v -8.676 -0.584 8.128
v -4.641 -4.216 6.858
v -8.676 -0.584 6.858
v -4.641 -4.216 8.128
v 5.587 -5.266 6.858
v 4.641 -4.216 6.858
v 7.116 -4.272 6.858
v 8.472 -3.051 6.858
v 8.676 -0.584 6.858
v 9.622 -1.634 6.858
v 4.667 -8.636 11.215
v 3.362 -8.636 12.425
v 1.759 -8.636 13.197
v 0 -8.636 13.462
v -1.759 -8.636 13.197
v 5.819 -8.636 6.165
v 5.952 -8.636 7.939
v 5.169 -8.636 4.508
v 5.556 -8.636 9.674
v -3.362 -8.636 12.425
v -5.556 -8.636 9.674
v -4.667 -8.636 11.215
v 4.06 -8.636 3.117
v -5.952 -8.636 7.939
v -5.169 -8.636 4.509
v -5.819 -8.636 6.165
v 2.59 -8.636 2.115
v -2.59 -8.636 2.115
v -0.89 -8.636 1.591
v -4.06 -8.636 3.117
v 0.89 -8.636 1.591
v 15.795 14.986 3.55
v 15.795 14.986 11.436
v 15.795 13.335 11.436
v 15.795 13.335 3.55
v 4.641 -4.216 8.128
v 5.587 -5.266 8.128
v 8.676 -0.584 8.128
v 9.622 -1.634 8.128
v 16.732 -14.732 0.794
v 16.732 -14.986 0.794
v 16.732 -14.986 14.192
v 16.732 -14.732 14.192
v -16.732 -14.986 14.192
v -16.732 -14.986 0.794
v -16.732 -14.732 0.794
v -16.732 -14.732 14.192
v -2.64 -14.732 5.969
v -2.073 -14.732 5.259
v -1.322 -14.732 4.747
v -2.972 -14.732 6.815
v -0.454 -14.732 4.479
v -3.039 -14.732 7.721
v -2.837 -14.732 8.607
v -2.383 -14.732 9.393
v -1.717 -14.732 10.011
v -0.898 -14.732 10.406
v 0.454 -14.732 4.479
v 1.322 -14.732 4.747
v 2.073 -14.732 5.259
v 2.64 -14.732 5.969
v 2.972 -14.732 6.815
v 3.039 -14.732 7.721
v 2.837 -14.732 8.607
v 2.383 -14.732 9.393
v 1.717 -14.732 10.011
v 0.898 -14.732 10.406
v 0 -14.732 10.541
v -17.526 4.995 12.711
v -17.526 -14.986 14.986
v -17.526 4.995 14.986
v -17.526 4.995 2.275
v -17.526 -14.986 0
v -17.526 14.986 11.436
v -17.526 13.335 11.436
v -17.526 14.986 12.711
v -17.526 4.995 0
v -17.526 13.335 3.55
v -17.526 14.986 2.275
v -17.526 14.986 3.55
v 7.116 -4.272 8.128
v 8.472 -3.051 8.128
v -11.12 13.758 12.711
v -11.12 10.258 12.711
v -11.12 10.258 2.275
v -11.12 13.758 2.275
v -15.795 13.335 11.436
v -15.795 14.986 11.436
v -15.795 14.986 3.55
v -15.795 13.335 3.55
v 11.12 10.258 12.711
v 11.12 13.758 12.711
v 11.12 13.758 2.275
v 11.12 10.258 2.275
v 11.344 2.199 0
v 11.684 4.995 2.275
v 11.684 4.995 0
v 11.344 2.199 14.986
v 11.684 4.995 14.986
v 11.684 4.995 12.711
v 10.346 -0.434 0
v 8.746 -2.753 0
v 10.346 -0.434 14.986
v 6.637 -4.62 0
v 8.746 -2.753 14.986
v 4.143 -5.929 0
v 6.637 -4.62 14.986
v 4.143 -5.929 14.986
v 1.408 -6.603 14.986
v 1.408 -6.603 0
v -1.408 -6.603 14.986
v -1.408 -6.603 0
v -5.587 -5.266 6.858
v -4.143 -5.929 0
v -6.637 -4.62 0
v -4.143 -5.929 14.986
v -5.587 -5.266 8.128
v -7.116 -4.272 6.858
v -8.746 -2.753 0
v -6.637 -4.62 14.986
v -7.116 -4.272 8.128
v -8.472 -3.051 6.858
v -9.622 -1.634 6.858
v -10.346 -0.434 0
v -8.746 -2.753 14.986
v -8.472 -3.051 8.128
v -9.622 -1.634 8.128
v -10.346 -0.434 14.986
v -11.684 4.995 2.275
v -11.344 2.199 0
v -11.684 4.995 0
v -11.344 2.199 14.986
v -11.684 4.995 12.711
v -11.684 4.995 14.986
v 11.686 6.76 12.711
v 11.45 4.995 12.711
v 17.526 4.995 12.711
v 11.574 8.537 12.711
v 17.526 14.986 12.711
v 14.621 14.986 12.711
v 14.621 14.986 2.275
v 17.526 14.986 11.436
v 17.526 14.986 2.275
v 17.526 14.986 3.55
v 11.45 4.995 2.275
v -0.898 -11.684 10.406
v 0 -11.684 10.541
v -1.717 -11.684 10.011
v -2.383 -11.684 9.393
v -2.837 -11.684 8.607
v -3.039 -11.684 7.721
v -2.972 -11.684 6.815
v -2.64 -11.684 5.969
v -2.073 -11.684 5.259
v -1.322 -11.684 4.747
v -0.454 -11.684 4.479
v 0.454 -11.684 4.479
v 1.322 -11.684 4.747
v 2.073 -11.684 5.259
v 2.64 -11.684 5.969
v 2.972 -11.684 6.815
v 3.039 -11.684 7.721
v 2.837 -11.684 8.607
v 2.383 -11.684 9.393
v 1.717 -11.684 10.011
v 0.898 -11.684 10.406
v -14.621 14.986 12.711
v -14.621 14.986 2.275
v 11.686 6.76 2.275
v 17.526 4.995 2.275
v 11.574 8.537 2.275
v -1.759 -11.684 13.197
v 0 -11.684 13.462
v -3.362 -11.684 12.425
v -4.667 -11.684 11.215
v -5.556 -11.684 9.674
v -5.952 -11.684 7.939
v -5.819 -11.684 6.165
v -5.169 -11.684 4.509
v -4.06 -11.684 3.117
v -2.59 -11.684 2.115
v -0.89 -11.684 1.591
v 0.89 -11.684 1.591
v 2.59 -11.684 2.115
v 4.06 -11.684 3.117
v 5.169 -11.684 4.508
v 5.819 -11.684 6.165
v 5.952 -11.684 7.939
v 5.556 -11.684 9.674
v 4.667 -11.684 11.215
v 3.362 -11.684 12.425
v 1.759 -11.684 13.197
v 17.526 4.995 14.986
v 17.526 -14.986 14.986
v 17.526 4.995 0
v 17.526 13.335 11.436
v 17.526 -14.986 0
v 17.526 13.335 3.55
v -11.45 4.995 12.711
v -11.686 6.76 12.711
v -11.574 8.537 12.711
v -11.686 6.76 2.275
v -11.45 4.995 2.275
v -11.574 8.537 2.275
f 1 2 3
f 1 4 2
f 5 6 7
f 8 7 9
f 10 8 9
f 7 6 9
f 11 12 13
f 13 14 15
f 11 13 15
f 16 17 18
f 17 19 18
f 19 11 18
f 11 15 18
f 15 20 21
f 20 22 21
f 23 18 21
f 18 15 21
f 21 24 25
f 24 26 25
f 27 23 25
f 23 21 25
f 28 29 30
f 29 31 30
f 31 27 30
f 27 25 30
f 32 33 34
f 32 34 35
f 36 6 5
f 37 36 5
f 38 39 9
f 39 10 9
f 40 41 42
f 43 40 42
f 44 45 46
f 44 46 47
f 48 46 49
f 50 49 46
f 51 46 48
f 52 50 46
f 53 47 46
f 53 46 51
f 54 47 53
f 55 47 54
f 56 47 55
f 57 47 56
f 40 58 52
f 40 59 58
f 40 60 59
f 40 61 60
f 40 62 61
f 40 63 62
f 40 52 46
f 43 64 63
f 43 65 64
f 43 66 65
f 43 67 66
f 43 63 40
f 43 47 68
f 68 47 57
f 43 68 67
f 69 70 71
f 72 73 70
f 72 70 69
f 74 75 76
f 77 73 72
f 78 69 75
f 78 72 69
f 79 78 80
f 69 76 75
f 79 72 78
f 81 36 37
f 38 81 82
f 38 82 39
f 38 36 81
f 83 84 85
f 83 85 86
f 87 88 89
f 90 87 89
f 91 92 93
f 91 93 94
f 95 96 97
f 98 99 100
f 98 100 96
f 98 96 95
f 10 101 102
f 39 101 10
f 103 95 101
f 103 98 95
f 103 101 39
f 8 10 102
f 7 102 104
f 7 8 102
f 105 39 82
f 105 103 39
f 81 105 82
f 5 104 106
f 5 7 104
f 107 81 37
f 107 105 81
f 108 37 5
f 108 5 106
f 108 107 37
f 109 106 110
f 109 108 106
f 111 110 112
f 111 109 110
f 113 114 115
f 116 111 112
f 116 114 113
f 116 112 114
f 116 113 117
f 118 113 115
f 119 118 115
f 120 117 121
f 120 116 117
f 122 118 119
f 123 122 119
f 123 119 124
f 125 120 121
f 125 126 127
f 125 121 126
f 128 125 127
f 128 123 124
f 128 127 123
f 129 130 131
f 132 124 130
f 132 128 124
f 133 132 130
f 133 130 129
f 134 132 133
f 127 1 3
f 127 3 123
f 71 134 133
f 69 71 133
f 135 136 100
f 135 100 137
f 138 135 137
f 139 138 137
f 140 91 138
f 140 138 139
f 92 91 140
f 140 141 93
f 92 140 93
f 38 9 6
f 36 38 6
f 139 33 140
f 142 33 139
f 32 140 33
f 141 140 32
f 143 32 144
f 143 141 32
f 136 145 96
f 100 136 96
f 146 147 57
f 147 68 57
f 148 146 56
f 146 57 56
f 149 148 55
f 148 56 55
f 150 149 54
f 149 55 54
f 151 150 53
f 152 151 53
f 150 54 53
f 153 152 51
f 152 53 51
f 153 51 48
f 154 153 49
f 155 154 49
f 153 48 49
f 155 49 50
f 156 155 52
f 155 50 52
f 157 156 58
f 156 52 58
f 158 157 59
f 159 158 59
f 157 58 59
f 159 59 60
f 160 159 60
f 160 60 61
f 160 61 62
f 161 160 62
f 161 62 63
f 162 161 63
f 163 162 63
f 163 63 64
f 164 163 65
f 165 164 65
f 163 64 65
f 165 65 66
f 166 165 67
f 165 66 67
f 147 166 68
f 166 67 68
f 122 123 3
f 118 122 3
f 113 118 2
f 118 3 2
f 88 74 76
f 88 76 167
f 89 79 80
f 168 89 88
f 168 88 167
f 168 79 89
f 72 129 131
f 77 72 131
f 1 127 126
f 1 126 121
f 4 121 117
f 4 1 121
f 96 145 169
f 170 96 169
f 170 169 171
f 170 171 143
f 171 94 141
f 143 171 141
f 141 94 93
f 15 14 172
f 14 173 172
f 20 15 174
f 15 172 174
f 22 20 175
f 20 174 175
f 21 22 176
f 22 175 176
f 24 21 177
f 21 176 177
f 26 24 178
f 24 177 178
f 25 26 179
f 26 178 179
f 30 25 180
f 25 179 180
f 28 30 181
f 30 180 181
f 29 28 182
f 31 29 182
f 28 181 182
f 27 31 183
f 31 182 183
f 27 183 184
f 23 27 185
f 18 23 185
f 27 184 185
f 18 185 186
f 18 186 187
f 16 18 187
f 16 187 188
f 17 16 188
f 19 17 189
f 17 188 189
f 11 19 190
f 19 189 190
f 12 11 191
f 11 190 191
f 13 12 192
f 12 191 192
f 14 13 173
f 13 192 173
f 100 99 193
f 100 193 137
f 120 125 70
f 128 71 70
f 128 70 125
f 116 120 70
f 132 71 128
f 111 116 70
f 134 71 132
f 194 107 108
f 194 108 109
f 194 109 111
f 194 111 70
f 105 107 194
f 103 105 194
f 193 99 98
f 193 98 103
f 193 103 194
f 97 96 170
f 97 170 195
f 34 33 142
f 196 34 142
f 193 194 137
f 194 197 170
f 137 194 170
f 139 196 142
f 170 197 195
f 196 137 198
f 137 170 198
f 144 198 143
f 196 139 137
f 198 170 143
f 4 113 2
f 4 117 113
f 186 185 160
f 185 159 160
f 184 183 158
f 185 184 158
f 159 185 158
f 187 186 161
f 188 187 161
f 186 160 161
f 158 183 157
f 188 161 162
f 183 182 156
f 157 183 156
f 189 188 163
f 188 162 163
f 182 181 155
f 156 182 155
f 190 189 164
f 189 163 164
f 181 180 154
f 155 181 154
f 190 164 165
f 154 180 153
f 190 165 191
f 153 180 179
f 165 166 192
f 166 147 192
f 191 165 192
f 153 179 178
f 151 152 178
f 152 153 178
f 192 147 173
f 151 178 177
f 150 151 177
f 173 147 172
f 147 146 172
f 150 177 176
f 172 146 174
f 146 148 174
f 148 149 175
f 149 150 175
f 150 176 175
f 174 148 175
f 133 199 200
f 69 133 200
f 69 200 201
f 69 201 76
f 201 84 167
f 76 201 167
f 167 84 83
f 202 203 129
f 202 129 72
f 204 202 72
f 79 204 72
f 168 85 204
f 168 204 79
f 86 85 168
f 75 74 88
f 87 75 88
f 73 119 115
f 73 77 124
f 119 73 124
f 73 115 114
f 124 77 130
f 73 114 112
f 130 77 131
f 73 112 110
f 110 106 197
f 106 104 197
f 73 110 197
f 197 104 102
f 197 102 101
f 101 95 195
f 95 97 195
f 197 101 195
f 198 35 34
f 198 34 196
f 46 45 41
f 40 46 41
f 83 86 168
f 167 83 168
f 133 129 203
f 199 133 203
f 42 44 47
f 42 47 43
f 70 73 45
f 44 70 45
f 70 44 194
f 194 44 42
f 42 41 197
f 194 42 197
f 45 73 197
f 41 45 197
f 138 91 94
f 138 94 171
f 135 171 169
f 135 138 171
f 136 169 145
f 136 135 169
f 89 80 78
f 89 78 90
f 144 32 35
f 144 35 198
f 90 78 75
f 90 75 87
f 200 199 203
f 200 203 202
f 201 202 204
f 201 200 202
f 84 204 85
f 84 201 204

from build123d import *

# Parameters (mm, degrees)
SKETCH1_W               = 35.052
SKETCH1_H               = 29.972
EXTRUDE1_DEPTH          = 14.986
CUT_EXTRUDE1_DEPTH      = 15.986
SKETCH3_W               = 2.27457
SKETCH3_H               = 9.990666667
CUT_EXTRUDE2_DEPTH      = 18.526
CUT_EXTRUDE2_DEPTH_BACK = 18.526
SKETCH4_W               = 33.4645
SKETCH4_H               = 13.3985
CUT_EXTRUDE3_DEPTH      = 0.254
SKETCH5_W               = 1.731382872
SKETCH5_H               = 7.88543
CUT_EXTRUDE4_DEPTH      = 1.651
EXTRUDE2_DEPTH          = 0.635


with BuildPart() as part:
    # Sketch1 → Extrude1 (new body)
    with BuildSketch(Plane.XY):
        Rectangle(SKETCH1_W, SKETCH1_H)
    extrude(amount=EXTRUDE1_DEPTH)

    # Sketch2 → Cut-Extrude1 (cut, through all)
    with BuildSketch(Plane.XY.offset(14.986)):
        with BuildLine():
            Line((-11.684, 4.995333333), (-11.45032, 4.995333333))
            ThreePointArc((-11.45032, 4.995333333), (-11.673292179, 7.650930846), (-11.1204375, 10.257895833))
            Line((-11.1204375, 10.257895833), (-11.1204375, 13.758333333))
            Line((-11.1204375, 13.758333333), (-14.620875, 14.986))
            Line((-14.620875, 14.986), (14.620875, 14.986))
            Line((14.620875, 14.986), (11.1204375, 13.758333333))
            Line((11.1204375, 13.758333333), (11.1204375, 10.257895833))
            ThreePointArc((11.1204375, 10.257895833), (11.673292179, 7.650930846), (11.45032, 4.995333333))
            Line((11.45032, 4.995333333), (11.684, 4.995333333))
            ThreePointArc((11.684, 4.995333333), (0, -6.688666667), (-11.684, 4.995333333))
        make_face()
    extrude(amount=-CUT_EXTRUDE1_DEPTH, mode=Mode.SUBTRACT)

    # Sketch3 → Cut-Extrude2 (cut, two sides)
    with BuildSketch(Plane(origin=(0, 0, 0), x_dir=(0, 0, -1), z_dir=(1, 0, 0))) as cut_extrude2_sk:
        with Locations((-13.848715, 9.990666667)):
            Rectangle(SKETCH3_W, SKETCH3_H)
        with Locations((-1.137285, 9.990666667)):
            Rectangle(SKETCH3_W, SKETCH3_H)
    extrude(amount=CUT_EXTRUDE2_DEPTH, mode=Mode.SUBTRACT)
    extrude(cut_extrude2_sk.sketch, amount=-CUT_EXTRUDE2_DEPTH_BACK, mode=Mode.SUBTRACT)

    # Sketch4 → Cut-Extrude3 (cut)
    with BuildSketch(Plane.XZ.offset(14.986)):
        with Locations((0, 7.493)):
            Rectangle(SKETCH4_W, SKETCH4_H)
    extrude(amount=-CUT_EXTRUDE3_DEPTH, mode=Mode.SUBTRACT)

    # Sketch5 → Cut-Extrude4 (cut)
    with BuildSketch(Plane(origin=(0, 14.986, 0), x_dir=(1, 0, 0), z_dir=(0, 1, 0))):
        with Locations((-16.660308564, -7.493)):
            Rectangle(SKETCH5_W, SKETCH5_H)
        with Locations((16.660308564, -7.493)):
            Rectangle(SKETCH5_W, SKETCH5_H)
    extrude(amount=-CUT_EXTRUDE4_DEPTH, mode=Mode.SUBTRACT)

    # Sketch6 → Cut-Revolve1 (revolve, cut)
    with BuildSketch(Plane(origin=(0, 0, 7.493), x_dir=(-1, 0, 0), z_dir=(0, 0, -1)), mode=Mode.PRIVATE) as cut_revolve1_sk:
        Polygon((3.048, -14.732), (0, -14.732), (0, -8.636), (5.969, -8.636), (5.969, -11.684), (3.048, -11.684), align=None)
    revolve(cut_revolve1_sk.sketch.rotate(Axis((0, 0, 7.493), (0, -1, 0)), 270), axis=Axis((0, 0, 7.493), (0, -1, 0)), mode=Mode.SUBTRACT)  # turned: the seam where the file's is

    # Sketch7 → Extrude2 (add, symmetric)
    with BuildSketch(Plane(origin=(0, 0, 7.493), x_dir=(-1, 0, 0), z_dir=(0, 0, -1))):
        with BuildLine():
            Line((4.641424464, -4.216434167), (8.676143507, -0.583556822))
            Line((8.676143507, -0.583556822), (9.621541413, -1.633527567))
            ThreePointArc((9.621541413, -1.633527567), (7.818122005, -3.687570808), (5.586822369, -5.266404912))
            Line((5.586822369, -5.266404912), (4.641424464, -4.216434167))
        make_face()
        with BuildLine():
            Line((-4.641424464, -4.216434167), (-5.586822369, -5.266404912))
            ThreePointArc((-5.586822369, -5.266404912), (-7.818122005, -3.687570808), (-9.621541413, -1.633527567))
            Line((-9.621541413, -1.633527567), (-8.676143507, -0.583556822))
            Line((-8.676143507, -0.583556822), (-4.641424464, -4.216434167))
        make_face()
    extrude(amount=EXTRUDE2_DEPTH, both=True)


solid = part.part
